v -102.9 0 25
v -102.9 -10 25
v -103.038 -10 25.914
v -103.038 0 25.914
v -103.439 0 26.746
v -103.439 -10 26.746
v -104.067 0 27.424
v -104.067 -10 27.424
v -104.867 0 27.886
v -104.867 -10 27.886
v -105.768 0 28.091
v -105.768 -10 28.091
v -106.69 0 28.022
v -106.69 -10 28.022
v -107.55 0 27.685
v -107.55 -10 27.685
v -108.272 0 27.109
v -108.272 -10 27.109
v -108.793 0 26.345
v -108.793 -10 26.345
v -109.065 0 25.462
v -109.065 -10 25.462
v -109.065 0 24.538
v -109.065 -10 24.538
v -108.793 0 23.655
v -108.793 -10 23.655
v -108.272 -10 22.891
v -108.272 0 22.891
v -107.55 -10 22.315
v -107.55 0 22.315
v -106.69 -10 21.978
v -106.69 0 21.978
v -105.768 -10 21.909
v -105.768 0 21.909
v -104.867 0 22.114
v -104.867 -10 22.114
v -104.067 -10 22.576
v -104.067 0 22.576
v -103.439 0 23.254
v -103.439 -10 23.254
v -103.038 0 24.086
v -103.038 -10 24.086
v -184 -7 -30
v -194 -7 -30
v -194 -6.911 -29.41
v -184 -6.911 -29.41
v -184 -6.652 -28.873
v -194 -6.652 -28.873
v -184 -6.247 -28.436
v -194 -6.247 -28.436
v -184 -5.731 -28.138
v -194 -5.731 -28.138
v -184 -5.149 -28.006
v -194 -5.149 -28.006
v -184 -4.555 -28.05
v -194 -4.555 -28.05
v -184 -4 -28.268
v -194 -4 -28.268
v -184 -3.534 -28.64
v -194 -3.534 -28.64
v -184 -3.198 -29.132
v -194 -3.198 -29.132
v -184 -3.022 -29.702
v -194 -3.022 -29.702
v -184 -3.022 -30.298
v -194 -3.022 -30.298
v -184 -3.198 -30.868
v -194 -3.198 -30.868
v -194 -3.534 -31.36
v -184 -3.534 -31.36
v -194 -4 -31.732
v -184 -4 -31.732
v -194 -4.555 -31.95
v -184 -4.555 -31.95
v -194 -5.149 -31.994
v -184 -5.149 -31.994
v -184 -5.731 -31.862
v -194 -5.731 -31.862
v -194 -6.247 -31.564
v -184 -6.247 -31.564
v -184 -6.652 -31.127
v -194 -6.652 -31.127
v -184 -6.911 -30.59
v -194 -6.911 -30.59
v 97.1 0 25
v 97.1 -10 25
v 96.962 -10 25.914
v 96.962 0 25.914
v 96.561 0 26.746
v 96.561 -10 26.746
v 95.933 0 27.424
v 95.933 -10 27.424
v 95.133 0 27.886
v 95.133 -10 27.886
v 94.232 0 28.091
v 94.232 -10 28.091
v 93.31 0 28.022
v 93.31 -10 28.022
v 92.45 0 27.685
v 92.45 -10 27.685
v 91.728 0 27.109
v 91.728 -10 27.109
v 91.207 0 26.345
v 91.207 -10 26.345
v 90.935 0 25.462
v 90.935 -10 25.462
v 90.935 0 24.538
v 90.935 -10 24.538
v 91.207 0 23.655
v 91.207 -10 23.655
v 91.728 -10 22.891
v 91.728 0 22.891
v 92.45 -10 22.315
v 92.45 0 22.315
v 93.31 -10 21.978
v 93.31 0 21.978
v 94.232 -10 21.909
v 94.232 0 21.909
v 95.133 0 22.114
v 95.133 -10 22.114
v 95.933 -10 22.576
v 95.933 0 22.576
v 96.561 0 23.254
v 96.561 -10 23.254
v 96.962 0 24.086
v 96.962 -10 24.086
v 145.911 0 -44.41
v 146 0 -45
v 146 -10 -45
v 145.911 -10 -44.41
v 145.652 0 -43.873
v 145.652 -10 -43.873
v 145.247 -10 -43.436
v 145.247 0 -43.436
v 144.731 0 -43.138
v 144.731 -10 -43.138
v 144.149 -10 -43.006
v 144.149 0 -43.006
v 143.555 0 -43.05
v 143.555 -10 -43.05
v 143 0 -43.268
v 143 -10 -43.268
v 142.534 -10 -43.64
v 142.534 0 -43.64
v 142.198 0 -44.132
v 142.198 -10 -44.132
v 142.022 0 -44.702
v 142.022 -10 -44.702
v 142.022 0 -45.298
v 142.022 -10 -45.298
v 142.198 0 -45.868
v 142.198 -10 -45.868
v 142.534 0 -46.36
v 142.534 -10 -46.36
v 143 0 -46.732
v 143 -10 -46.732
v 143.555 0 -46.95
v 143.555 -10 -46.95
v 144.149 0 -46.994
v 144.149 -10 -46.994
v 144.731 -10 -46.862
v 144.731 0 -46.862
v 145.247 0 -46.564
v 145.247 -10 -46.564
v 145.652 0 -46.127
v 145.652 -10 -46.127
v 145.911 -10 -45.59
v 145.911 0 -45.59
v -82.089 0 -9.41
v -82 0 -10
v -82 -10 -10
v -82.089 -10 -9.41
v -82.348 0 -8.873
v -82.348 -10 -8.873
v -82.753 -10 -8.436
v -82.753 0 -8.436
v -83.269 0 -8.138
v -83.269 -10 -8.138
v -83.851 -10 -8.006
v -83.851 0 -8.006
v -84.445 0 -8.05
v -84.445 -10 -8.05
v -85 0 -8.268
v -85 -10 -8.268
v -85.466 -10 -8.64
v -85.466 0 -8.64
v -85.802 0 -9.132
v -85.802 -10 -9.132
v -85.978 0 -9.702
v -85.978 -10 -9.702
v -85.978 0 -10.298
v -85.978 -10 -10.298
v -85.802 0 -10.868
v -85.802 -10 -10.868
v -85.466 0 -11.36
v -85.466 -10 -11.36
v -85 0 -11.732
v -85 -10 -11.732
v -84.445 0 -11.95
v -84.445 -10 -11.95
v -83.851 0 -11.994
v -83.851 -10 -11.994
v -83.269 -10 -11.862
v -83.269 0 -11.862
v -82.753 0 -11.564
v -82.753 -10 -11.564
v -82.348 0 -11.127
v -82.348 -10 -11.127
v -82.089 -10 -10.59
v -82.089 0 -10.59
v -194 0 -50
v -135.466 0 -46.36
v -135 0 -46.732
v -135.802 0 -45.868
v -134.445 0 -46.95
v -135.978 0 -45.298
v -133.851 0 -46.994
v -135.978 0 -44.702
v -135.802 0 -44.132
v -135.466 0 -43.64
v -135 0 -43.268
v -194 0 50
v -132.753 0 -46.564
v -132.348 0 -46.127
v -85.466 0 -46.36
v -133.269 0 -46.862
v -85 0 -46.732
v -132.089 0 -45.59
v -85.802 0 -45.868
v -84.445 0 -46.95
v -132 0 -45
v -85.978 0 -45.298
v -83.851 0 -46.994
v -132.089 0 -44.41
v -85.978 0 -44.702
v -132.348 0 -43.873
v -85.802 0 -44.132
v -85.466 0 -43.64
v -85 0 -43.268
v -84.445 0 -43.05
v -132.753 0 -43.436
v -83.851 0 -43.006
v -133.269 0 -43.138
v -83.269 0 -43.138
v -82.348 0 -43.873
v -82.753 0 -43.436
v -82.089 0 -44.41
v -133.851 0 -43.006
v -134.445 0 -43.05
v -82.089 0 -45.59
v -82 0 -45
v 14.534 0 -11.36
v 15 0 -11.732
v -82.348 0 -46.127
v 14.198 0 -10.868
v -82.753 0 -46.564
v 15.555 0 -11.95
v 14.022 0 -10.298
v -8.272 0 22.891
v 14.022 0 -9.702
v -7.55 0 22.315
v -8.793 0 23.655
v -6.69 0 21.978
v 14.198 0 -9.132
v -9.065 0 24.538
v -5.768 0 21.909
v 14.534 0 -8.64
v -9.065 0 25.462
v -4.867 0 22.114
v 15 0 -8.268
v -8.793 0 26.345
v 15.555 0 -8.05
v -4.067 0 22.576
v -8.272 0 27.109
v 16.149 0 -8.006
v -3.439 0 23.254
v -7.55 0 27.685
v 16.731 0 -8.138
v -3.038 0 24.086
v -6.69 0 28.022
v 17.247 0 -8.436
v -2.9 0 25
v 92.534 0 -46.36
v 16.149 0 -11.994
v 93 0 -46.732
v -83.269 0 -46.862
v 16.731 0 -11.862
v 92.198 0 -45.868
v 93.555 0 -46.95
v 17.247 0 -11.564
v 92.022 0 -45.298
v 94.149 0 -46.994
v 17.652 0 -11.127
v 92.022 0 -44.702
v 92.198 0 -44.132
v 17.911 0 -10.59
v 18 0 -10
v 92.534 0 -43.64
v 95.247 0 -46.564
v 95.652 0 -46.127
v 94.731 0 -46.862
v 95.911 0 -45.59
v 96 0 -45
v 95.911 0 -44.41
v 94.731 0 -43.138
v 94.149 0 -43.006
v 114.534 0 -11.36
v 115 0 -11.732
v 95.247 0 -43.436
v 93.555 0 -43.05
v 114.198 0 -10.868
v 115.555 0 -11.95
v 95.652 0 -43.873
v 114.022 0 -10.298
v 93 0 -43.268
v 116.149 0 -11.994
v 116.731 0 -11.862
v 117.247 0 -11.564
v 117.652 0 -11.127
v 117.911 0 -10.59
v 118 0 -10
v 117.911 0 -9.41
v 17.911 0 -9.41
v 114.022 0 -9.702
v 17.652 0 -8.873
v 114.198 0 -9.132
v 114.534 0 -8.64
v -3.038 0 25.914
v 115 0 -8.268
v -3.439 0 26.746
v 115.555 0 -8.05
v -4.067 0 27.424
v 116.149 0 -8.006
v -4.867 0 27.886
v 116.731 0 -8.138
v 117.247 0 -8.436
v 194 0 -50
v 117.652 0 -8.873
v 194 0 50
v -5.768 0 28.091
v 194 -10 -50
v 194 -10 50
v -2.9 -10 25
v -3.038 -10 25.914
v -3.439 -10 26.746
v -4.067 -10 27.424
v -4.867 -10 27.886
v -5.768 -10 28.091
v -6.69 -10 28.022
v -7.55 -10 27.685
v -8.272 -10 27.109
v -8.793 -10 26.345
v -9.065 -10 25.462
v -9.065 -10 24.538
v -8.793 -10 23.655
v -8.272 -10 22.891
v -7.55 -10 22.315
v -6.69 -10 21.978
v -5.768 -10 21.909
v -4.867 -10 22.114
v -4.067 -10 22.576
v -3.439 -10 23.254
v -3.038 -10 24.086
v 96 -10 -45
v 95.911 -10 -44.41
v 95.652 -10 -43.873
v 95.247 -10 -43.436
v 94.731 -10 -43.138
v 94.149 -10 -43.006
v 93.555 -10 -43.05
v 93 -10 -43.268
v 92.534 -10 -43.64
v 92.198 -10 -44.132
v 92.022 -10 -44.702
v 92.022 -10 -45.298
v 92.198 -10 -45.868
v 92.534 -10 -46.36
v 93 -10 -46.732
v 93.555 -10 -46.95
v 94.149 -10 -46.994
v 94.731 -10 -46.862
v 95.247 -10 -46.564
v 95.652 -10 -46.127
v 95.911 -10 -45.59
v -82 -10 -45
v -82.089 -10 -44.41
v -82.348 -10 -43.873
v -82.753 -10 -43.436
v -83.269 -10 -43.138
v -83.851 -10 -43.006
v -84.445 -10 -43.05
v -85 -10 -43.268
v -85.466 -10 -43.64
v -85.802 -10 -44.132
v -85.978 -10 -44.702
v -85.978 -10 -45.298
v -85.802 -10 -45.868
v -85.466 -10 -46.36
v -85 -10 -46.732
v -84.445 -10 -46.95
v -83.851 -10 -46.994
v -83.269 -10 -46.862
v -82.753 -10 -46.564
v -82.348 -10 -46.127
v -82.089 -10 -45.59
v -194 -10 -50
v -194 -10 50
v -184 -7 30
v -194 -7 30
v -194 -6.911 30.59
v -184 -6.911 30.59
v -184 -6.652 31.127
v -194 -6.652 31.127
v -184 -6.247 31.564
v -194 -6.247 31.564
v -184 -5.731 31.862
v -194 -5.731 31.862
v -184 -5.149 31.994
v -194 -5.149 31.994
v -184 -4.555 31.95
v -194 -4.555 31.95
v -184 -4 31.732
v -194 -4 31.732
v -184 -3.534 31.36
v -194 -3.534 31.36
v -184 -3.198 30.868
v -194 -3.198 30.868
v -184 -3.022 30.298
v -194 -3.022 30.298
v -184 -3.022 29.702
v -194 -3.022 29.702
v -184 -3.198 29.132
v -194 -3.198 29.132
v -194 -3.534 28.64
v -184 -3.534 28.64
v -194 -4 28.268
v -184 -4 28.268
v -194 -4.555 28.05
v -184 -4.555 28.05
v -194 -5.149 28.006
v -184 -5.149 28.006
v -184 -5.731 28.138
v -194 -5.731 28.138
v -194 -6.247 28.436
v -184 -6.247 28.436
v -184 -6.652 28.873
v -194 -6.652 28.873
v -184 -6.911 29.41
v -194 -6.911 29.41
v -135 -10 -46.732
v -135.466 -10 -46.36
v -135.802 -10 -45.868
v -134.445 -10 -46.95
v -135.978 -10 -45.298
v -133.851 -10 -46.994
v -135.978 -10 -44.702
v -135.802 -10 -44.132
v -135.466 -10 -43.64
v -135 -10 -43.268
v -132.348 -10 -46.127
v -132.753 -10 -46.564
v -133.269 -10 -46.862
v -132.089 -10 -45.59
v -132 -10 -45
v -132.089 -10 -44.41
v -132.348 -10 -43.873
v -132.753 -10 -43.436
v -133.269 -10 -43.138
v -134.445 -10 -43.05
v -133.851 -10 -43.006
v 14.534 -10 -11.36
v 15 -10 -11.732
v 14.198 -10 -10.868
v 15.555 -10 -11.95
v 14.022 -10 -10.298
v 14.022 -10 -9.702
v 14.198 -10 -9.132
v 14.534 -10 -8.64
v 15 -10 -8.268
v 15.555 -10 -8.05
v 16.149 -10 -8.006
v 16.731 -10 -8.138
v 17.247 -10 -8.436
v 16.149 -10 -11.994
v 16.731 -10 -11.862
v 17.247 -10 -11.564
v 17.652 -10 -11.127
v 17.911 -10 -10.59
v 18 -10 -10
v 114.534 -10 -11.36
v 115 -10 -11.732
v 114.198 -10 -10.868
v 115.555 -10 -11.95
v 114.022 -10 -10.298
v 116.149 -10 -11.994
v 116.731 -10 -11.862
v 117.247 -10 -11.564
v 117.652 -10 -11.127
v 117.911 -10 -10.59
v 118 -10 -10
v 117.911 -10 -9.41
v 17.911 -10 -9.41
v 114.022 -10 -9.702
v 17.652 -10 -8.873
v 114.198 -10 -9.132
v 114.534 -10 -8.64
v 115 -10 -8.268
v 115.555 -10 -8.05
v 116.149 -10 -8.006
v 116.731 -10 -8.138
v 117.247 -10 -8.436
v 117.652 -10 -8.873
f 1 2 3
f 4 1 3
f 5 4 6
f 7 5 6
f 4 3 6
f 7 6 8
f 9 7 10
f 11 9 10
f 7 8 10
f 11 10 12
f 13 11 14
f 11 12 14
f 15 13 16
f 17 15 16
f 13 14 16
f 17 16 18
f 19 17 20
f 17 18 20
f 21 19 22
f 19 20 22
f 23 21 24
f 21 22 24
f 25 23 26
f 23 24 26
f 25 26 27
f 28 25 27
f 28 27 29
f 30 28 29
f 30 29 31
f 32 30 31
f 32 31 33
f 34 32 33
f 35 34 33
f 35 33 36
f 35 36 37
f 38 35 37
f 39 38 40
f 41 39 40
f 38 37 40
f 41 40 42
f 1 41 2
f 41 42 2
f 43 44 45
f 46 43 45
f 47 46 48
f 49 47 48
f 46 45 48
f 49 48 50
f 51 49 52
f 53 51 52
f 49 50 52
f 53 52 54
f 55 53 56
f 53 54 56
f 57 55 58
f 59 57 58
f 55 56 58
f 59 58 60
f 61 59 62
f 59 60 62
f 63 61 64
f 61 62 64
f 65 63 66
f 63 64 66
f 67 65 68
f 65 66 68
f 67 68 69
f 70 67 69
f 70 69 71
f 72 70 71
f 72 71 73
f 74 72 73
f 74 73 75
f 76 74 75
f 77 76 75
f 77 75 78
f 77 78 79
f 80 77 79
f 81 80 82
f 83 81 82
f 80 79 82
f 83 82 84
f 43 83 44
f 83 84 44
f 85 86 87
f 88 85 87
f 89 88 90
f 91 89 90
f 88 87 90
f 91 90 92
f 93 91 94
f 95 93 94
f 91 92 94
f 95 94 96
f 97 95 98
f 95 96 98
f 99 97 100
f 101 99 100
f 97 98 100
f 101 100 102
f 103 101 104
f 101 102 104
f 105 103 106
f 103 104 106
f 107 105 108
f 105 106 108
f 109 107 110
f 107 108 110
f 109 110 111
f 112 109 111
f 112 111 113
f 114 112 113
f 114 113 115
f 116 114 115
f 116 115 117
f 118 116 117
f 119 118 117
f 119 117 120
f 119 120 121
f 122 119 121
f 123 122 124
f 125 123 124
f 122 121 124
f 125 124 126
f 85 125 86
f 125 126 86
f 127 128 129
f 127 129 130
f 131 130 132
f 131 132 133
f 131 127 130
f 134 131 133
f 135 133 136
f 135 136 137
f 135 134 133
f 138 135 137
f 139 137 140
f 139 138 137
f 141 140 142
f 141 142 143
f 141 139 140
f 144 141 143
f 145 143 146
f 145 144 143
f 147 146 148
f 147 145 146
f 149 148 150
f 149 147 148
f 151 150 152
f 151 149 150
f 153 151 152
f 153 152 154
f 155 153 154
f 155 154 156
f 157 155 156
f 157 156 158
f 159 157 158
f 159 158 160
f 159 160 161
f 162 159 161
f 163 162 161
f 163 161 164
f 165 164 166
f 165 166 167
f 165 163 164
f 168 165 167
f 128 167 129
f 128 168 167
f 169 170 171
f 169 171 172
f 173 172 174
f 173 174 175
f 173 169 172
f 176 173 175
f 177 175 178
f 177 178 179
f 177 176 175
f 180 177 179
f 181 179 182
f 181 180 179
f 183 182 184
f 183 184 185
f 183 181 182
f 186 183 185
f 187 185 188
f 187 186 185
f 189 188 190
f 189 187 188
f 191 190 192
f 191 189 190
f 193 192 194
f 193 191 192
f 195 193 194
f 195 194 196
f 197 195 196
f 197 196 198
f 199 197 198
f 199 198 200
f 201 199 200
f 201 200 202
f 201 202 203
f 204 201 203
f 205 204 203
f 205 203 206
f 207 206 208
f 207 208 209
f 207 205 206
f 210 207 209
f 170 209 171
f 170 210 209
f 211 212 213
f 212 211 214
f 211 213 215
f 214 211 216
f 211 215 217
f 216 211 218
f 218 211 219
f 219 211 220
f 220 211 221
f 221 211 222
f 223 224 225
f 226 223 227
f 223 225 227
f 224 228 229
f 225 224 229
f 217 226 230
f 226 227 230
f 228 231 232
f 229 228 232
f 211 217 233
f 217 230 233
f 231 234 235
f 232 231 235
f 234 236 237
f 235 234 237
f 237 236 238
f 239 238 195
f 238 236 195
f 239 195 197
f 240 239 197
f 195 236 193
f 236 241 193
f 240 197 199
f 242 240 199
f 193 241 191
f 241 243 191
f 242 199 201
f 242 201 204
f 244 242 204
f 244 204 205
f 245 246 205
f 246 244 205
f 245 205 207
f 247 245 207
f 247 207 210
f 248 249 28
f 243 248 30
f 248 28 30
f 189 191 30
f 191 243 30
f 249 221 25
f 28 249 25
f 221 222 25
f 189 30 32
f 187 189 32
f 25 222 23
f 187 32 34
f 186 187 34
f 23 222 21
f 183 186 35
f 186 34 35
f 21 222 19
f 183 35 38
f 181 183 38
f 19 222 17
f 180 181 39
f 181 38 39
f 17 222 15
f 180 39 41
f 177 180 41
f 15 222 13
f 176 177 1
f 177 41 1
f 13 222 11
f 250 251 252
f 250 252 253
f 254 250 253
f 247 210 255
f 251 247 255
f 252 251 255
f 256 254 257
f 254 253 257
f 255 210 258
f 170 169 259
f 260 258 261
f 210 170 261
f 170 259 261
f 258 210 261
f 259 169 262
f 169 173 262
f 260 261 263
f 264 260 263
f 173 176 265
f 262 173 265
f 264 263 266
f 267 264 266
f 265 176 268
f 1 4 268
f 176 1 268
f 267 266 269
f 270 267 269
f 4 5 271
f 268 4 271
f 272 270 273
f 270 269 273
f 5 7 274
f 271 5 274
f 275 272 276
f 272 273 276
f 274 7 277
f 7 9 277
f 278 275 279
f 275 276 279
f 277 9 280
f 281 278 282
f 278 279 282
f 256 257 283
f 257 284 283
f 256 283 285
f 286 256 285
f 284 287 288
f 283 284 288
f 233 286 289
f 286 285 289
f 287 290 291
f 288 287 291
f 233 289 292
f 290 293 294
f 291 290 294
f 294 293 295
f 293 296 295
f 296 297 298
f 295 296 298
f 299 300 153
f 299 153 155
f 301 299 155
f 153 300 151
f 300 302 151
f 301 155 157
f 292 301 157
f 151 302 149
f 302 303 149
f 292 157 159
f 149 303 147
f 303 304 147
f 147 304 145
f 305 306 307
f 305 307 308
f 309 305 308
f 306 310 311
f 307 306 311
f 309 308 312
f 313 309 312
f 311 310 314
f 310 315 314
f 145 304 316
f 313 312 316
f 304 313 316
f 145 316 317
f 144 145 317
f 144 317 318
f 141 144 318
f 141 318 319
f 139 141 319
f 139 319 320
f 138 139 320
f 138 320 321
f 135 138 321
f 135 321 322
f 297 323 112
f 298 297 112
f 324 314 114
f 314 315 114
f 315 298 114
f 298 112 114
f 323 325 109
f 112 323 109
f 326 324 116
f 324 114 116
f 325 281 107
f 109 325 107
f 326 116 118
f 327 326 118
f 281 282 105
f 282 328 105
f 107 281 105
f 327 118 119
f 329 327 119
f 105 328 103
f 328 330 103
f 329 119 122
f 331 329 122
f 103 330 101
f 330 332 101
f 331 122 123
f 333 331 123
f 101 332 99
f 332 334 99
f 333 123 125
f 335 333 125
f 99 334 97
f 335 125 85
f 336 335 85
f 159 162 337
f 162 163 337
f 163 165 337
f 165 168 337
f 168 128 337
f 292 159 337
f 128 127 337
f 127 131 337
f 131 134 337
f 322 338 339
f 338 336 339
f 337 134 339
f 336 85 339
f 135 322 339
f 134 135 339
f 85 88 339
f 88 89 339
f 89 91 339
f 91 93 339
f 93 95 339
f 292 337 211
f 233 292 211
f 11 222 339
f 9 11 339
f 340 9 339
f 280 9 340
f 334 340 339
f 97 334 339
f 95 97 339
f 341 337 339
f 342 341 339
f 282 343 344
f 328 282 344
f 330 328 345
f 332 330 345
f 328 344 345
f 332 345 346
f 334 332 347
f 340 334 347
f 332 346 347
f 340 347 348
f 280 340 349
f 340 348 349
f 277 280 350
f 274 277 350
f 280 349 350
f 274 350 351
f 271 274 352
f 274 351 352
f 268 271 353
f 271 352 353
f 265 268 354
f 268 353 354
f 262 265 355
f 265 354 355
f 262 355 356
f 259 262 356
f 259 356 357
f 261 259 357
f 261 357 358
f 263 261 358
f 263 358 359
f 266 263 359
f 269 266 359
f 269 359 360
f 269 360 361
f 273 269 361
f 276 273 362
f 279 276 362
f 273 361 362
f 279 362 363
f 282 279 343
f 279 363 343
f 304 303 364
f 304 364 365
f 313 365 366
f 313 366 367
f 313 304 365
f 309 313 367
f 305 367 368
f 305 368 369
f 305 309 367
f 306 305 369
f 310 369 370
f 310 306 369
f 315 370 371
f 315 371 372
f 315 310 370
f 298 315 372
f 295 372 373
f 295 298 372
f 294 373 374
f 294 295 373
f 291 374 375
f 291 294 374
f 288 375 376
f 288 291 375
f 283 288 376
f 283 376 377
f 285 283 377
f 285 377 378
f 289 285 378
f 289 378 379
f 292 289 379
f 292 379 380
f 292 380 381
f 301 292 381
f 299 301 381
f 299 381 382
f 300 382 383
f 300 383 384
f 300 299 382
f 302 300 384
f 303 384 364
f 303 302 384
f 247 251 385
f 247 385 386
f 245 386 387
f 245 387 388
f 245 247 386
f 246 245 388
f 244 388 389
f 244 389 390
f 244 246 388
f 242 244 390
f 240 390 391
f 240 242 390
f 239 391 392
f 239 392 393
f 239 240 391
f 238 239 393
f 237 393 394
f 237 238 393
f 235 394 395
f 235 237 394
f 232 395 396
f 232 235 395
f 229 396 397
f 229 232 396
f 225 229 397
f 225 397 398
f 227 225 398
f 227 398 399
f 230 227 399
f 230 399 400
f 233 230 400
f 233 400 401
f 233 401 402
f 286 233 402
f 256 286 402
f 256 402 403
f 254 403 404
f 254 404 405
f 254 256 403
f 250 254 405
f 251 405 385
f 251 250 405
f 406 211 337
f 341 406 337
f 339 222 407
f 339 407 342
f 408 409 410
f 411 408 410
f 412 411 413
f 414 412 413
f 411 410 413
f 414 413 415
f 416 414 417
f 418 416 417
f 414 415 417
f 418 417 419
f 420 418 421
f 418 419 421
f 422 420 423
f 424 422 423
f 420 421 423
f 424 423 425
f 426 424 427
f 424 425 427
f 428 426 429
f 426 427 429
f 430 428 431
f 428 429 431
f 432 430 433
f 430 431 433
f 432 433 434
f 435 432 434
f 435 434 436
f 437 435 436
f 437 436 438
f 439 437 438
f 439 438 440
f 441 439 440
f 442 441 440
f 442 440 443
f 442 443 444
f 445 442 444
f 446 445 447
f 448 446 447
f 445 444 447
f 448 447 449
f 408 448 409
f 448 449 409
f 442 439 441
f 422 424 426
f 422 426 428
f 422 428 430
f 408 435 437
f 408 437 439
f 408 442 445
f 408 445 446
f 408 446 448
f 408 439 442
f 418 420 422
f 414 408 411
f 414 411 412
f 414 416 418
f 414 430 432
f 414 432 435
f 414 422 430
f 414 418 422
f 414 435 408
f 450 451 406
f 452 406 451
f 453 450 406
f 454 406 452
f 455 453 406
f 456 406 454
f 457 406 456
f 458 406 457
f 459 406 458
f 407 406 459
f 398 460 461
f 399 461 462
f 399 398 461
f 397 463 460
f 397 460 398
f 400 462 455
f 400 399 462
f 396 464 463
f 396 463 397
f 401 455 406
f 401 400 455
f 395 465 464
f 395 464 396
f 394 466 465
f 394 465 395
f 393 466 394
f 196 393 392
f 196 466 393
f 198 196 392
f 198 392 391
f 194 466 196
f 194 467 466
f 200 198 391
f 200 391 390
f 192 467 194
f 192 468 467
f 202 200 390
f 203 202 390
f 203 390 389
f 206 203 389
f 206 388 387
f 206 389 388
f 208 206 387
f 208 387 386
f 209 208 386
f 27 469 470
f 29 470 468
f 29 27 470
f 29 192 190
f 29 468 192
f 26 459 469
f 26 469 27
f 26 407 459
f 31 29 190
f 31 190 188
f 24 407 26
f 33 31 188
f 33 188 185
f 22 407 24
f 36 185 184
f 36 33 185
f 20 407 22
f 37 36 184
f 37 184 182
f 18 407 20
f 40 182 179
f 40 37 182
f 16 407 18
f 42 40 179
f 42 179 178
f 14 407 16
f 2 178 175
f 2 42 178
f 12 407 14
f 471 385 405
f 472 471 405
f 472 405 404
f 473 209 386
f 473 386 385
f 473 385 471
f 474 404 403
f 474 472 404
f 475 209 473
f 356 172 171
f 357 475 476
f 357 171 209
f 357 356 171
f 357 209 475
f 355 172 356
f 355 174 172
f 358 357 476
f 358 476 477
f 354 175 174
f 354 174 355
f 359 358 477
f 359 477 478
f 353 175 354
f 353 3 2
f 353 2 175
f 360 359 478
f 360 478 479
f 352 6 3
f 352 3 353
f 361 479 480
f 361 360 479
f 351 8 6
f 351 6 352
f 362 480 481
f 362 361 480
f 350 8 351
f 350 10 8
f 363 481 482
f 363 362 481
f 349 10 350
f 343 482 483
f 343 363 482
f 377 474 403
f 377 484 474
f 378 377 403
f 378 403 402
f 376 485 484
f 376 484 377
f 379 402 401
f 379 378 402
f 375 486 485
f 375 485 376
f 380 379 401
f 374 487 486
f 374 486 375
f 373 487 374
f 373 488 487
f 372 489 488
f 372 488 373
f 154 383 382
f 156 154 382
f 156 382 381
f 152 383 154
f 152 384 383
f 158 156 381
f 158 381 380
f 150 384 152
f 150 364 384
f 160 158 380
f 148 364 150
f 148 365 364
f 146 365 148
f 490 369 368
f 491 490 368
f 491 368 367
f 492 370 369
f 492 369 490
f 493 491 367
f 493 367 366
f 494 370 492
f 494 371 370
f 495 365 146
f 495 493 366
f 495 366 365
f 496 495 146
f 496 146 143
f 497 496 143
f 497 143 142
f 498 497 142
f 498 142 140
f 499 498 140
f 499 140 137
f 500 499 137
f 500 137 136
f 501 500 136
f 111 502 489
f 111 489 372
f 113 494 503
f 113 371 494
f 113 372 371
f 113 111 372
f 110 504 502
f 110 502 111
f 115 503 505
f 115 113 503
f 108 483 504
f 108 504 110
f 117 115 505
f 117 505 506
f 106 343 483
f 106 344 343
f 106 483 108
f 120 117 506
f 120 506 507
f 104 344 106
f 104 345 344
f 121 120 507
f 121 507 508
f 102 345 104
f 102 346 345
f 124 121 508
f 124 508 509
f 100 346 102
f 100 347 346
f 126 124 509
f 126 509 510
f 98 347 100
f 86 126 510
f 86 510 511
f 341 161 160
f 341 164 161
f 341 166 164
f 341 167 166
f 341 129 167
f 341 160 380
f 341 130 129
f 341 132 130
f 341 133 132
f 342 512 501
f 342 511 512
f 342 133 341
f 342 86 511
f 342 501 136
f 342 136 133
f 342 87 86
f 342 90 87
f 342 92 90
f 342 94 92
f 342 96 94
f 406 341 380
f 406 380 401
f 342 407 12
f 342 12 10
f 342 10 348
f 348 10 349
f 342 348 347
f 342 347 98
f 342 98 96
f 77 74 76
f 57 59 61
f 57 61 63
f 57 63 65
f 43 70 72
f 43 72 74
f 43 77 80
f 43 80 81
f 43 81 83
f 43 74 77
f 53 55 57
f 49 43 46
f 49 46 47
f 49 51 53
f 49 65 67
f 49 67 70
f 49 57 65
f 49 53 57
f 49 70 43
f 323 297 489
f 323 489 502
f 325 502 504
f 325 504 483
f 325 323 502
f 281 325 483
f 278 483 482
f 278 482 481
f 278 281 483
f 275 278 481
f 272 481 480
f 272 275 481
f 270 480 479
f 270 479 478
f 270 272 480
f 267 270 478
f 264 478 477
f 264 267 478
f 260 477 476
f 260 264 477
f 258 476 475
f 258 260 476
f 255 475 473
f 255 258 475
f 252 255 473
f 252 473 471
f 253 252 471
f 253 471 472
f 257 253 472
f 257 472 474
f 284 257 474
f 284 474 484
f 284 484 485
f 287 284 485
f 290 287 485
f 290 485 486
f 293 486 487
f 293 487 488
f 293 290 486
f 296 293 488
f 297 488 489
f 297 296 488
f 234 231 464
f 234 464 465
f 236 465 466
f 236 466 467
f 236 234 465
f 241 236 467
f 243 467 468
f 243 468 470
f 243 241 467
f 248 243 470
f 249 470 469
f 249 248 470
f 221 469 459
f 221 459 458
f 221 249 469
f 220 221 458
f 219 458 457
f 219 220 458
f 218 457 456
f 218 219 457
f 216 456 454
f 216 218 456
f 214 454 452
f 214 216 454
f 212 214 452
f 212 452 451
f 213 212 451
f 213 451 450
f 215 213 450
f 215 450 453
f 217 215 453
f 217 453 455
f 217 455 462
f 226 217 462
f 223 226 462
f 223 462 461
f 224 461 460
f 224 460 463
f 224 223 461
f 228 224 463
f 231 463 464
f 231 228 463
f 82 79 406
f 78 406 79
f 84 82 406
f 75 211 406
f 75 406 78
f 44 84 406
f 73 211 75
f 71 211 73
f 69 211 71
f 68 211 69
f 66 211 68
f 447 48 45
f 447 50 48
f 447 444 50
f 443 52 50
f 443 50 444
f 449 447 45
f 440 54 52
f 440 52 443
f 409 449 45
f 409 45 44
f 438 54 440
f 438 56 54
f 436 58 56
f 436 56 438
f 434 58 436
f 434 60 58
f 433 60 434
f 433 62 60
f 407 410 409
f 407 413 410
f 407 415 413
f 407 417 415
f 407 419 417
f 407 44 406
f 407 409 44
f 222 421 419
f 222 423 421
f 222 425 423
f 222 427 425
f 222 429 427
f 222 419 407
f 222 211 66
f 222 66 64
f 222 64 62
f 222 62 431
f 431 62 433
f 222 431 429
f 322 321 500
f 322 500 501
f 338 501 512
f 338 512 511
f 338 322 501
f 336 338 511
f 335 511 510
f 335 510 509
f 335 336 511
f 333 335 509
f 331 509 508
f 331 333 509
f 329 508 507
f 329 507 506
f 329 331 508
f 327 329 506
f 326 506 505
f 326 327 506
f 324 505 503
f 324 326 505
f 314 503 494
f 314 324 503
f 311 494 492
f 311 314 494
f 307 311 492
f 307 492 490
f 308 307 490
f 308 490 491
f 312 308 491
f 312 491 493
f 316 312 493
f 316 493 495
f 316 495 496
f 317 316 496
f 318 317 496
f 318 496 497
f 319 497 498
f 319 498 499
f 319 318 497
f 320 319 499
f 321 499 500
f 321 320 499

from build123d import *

# Parameters (mm, degrees)
F0_W     = 388
F0_H     = 100
F0_R     = 2
F1_DEPTH = 10
F2_R     = 3.1
F3_DEPTH = 10
F4_R     = 2
F5_DEPTH = 10


with BuildPart() as f1:
    # F0 (on Front) → F1 (new body)
    with BuildSketch(Plane.XZ):
        Rectangle(F0_W, F0_H)
        with Locations((-134, -45)):
            Circle(F0_R, mode=Mode.SUBTRACT)
        with Locations((-84, -45)):
            Circle(F0_R, mode=Mode.SUBTRACT)
        with Locations((-84, -10)):
            Circle(F0_R, mode=Mode.SUBTRACT)
        with Locations((94, -45)):
            Circle(F0_R, mode=Mode.SUBTRACT)
        with Locations((144, -45)):
            Circle(F0_R, mode=Mode.SUBTRACT)
        with Locations((16, -10)):
            Circle(F0_R, mode=Mode.SUBTRACT)
        with Locations((116, -10)):
            Circle(F0_R, mode=Mode.SUBTRACT)
    extrude(amount=F1_DEPTH)

    # F2 (on face) → F3 (cut)
    with BuildSketch(Plane.XZ.offset(10)):
        with Locations((-6, 25)):
            Circle(F2_R)
        with Locations((94, 25)):
            Circle(F2_R)
        with Locations((-106, 25)):
            Circle(F2_R)
    extrude(amount=-F3_DEPTH, mode=Mode.SUBTRACT)

    # F4 (on face) → F5 (cut)
    with BuildSketch(Plane(origin=(-194, 0, 0), x_dir=(0, -1, 0), z_dir=(-1, 0, 0))):
        with Locations((5, -30)):
            Circle(F4_R)
        with Locations((5, 30)):
            Circle(F4_R)
    extrude(amount=-F5_DEPTH, mode=Mode.SUBTRACT)


solid = f1.part
